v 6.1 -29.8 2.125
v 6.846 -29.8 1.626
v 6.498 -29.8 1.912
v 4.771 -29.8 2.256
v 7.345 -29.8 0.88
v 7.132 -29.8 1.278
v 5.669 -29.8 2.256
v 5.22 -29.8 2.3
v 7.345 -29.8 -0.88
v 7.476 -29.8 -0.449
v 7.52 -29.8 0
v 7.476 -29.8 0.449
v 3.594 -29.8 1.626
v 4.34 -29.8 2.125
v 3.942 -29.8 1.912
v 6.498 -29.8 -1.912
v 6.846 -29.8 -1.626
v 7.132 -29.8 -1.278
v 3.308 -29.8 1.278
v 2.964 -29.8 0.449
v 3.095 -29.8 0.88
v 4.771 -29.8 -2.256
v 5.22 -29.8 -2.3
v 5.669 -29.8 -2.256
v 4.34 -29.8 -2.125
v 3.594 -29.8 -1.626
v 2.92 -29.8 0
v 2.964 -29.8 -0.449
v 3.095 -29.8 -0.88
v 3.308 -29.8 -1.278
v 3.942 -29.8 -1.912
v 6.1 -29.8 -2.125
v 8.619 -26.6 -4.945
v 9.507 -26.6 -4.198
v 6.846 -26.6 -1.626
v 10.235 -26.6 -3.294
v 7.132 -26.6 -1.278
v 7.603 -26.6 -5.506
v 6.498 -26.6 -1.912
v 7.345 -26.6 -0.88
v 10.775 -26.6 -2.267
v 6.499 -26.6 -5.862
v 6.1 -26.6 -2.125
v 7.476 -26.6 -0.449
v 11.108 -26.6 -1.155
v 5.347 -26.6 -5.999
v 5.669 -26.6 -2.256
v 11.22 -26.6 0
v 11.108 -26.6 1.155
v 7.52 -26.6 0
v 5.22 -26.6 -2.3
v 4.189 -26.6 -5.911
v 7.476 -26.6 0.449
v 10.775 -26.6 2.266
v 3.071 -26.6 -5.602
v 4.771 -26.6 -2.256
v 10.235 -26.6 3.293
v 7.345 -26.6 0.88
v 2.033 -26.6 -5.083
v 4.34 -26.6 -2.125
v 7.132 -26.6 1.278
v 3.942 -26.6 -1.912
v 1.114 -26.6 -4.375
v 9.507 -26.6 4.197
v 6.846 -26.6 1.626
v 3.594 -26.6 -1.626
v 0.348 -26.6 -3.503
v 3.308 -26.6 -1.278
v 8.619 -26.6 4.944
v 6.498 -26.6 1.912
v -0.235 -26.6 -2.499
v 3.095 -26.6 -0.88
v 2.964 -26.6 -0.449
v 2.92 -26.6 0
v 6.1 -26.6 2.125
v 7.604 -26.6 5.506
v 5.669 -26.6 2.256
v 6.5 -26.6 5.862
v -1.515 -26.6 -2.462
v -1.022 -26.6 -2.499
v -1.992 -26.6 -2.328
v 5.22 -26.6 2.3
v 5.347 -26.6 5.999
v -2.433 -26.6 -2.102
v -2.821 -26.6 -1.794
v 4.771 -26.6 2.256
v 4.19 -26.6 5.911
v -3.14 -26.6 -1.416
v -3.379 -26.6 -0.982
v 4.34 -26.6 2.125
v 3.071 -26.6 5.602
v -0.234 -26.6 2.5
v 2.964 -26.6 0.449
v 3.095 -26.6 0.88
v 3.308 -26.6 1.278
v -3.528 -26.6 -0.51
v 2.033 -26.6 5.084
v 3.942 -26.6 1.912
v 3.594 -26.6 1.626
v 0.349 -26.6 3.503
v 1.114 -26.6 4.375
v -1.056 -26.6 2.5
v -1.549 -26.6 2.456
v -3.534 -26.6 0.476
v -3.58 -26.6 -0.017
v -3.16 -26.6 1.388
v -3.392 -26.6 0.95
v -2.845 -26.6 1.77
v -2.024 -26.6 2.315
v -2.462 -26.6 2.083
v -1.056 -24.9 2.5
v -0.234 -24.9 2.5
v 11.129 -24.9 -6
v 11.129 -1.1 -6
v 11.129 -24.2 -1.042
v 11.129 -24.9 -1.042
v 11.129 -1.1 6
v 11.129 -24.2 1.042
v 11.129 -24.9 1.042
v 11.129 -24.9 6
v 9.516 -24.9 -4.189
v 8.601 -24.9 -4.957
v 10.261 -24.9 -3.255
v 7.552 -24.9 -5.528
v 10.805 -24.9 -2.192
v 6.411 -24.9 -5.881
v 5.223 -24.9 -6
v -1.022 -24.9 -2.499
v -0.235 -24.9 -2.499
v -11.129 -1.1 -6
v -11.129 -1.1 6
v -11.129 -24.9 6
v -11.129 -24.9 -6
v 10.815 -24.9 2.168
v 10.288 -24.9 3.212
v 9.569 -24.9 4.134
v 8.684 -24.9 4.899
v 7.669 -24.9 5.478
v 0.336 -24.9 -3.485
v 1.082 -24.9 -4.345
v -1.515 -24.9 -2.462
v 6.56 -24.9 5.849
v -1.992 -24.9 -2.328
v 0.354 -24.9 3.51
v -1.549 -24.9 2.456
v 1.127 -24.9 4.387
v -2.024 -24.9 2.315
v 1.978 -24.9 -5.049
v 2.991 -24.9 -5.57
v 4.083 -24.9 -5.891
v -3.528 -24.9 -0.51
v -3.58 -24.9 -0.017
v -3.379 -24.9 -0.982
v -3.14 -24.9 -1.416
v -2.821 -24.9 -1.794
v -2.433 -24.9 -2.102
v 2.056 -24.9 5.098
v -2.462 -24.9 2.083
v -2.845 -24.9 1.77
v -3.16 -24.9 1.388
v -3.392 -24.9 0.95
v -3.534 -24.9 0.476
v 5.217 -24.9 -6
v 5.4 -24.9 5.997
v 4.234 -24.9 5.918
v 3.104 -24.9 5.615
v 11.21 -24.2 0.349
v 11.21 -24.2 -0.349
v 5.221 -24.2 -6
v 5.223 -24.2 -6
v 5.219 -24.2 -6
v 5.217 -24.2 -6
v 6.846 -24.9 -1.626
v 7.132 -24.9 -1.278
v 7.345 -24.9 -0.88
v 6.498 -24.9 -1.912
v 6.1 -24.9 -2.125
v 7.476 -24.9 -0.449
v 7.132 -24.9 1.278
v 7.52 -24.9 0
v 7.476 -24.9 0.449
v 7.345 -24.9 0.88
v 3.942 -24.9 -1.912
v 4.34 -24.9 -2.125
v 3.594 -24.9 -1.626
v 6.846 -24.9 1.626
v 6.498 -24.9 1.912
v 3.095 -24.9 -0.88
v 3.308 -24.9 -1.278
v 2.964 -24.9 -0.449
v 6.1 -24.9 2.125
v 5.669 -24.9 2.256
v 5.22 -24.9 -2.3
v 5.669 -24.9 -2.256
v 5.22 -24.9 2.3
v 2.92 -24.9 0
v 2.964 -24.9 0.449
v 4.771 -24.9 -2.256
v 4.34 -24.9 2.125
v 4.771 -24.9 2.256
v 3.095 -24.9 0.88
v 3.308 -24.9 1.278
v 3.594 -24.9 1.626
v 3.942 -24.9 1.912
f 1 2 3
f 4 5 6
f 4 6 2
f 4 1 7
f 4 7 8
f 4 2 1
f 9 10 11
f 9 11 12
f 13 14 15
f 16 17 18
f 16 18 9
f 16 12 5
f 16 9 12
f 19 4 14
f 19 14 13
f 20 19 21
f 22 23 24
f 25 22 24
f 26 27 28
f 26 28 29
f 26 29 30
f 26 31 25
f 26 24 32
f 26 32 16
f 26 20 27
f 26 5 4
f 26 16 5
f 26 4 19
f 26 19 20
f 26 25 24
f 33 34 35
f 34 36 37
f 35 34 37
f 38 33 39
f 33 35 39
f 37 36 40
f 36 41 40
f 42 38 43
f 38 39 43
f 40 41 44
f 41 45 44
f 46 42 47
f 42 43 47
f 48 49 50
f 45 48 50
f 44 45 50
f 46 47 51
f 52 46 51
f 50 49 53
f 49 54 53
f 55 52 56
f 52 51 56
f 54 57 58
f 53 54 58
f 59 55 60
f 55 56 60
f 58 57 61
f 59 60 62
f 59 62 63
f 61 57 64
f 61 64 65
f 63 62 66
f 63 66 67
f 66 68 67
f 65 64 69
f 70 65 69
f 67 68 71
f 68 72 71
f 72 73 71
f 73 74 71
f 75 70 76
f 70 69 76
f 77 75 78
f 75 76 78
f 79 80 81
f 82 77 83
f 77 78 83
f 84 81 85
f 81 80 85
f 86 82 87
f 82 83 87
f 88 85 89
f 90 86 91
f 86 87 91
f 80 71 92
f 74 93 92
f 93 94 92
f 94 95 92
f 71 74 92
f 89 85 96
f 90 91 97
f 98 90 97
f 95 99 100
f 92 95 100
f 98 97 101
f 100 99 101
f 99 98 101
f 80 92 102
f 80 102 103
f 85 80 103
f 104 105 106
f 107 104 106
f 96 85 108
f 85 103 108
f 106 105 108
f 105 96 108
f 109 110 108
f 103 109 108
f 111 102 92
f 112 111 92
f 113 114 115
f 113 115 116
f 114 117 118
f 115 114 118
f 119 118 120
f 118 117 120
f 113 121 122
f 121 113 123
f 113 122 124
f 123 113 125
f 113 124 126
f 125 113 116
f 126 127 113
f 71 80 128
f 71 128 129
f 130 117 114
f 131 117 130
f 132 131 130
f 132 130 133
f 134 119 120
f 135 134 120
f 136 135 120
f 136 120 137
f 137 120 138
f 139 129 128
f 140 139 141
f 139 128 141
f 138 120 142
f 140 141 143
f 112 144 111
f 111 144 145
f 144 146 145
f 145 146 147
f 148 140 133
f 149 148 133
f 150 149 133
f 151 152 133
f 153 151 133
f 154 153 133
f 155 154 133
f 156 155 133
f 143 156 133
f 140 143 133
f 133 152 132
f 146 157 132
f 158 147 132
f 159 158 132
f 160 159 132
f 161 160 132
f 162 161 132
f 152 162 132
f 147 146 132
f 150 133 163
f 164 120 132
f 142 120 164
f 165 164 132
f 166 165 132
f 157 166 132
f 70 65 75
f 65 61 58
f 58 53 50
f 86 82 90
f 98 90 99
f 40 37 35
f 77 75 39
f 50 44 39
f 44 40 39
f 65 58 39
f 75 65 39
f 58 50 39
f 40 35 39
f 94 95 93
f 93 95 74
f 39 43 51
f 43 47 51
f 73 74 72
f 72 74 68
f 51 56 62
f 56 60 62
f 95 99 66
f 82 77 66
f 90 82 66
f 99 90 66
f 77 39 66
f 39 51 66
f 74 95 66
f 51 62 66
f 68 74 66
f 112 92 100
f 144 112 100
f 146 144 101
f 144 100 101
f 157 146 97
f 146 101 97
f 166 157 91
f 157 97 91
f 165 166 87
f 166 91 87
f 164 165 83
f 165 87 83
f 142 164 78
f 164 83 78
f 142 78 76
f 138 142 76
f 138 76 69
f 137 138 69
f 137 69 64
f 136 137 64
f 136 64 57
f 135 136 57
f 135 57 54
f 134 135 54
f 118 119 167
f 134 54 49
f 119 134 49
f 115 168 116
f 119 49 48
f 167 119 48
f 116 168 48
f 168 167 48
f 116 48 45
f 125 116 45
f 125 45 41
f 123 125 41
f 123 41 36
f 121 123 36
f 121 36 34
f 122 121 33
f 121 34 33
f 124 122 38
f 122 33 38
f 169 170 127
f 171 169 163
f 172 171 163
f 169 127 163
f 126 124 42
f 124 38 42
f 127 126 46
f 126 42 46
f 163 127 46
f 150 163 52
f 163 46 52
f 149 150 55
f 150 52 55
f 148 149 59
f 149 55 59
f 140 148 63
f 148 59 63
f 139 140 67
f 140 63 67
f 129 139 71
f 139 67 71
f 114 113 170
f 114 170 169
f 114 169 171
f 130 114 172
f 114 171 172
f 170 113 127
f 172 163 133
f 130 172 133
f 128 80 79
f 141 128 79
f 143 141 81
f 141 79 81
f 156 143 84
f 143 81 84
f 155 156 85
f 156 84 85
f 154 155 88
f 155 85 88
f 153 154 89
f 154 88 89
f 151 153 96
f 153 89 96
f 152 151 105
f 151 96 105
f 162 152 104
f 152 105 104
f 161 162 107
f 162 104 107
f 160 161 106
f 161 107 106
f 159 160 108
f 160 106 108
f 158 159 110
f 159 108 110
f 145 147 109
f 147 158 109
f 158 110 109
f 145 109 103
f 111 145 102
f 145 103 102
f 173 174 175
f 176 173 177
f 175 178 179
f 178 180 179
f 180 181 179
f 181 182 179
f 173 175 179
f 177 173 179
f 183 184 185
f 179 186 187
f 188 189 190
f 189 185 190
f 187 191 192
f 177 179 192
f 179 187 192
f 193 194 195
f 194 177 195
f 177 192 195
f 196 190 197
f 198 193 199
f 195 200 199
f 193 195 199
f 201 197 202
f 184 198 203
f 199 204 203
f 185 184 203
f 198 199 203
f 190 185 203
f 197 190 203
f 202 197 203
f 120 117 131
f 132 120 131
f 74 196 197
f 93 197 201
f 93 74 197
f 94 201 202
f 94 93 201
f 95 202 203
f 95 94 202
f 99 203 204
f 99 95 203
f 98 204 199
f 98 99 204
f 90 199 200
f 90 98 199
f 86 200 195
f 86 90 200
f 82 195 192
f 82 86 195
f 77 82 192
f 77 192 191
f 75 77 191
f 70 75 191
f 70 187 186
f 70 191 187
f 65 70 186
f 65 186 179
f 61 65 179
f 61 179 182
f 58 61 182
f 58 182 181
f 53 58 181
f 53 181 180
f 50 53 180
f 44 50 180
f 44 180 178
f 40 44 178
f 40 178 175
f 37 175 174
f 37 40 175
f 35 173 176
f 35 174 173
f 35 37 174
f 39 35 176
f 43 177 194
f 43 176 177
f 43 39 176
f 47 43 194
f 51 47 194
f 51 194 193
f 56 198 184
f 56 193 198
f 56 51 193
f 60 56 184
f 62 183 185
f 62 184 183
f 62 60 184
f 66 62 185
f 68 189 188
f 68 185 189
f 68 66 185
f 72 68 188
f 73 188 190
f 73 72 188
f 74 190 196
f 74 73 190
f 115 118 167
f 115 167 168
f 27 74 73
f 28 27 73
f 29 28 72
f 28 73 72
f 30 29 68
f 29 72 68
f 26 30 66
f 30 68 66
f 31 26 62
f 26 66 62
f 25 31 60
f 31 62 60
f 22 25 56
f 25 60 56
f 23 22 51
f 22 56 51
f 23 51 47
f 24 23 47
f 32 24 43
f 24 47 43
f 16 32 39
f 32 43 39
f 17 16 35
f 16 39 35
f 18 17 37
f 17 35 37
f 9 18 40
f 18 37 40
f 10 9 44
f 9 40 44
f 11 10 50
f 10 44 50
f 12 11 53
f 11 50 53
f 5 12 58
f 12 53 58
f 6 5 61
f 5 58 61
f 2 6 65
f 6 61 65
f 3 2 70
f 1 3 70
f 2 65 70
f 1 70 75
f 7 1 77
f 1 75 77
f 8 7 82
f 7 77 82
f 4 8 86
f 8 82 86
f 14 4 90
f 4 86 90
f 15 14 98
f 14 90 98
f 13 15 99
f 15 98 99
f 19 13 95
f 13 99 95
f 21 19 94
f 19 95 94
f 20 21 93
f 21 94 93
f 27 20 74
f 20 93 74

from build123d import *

# Parameters (mm, degrees)
SKETCH003_R             = 2.3
PAD003_DEPTH            = 2.4
CYLINDER_R              = 2.3
CYLINDER_DEPTH          = 3.2
SKETCH_W                = 22.257668
SKETCH_H                = 23.8
PAD_DEPTH               = 6
FUSION_PLACEMENT_ANGLE  = 180
BODY022_PLACEMENT_ANGLE = 180


with BuildPart() as body001:
    # Sketch003 → Pad003 (new body)
    with BuildSketch(Plane.XZ):
        with BuildLine():
            ThreePointArc((0.454409, 2.499884), (-11, -0.00031), (0.454668, -2.49932))
            Line((1.241684, -2.49932), (0.454668, -2.49932))
            ThreePointArc((1.241684, -2.49932), (3.799941, -0.017121), (1.275922, 2.499884))
            Line((1.275922, 2.499884), (0.454409, 2.499884))
        make_face()
        with Locations((-5, 0)):
            Circle(SKETCH003_R, mode=Mode.SUBTRACT)
    extrude(amount=PAD003_DEPTH)


with BuildPart() as body001_1:
    # Body001 placement: moved
    add(body001.part.moved(Location((-0.22, 13.6, 0))))


with BuildPart() as cylinder:
    # Cylinder → Cylinder (new body)
    with BuildSketch(Plane(origin=(-5.22, 13.6, 0), x_dir=(1, 0, 0), z_dir=(0, 1, 0))):
        Circle(CYLINDER_R)
    extrude(amount=CYLINDER_DEPTH)


with BuildPart() as servo9gright:
    # Sketch → Pad (new body, symmetric)
    with BuildSketch(Plane.XY):
        Rectangle(SKETCH_W, SKETCH_H)
    extrude(amount=PAD_DEPTH, both=True)

    # Fusion: union Body001, Cylinder
    add(body001_1.part)
    add(cylinder.part)


with BuildPart() as servo9gright_1:
    # Fusion placement: moved
    add(servo9gright.part.moved(Location((0, 13, 0))).rotate(Axis((0, 13, 0), (0, 1, 0)), FUSION_PLACEMENT_ANGLE))


with BuildPart() as servo9gright_2:
    # Clone placement: moved
    add(servo9gright_1.part.moved(Location((0, -1, 0))))


with BuildPart() as servo9gright_3:
    # Body022 placement: moved
    add(servo9gright_2.part.moved(Location((0, -1, 0))).rotate(Axis((0, -1, 0), (1, 0, 0)), BODY022_PLACEMENT_ANGLE))


solid = servo9gright_3.part
